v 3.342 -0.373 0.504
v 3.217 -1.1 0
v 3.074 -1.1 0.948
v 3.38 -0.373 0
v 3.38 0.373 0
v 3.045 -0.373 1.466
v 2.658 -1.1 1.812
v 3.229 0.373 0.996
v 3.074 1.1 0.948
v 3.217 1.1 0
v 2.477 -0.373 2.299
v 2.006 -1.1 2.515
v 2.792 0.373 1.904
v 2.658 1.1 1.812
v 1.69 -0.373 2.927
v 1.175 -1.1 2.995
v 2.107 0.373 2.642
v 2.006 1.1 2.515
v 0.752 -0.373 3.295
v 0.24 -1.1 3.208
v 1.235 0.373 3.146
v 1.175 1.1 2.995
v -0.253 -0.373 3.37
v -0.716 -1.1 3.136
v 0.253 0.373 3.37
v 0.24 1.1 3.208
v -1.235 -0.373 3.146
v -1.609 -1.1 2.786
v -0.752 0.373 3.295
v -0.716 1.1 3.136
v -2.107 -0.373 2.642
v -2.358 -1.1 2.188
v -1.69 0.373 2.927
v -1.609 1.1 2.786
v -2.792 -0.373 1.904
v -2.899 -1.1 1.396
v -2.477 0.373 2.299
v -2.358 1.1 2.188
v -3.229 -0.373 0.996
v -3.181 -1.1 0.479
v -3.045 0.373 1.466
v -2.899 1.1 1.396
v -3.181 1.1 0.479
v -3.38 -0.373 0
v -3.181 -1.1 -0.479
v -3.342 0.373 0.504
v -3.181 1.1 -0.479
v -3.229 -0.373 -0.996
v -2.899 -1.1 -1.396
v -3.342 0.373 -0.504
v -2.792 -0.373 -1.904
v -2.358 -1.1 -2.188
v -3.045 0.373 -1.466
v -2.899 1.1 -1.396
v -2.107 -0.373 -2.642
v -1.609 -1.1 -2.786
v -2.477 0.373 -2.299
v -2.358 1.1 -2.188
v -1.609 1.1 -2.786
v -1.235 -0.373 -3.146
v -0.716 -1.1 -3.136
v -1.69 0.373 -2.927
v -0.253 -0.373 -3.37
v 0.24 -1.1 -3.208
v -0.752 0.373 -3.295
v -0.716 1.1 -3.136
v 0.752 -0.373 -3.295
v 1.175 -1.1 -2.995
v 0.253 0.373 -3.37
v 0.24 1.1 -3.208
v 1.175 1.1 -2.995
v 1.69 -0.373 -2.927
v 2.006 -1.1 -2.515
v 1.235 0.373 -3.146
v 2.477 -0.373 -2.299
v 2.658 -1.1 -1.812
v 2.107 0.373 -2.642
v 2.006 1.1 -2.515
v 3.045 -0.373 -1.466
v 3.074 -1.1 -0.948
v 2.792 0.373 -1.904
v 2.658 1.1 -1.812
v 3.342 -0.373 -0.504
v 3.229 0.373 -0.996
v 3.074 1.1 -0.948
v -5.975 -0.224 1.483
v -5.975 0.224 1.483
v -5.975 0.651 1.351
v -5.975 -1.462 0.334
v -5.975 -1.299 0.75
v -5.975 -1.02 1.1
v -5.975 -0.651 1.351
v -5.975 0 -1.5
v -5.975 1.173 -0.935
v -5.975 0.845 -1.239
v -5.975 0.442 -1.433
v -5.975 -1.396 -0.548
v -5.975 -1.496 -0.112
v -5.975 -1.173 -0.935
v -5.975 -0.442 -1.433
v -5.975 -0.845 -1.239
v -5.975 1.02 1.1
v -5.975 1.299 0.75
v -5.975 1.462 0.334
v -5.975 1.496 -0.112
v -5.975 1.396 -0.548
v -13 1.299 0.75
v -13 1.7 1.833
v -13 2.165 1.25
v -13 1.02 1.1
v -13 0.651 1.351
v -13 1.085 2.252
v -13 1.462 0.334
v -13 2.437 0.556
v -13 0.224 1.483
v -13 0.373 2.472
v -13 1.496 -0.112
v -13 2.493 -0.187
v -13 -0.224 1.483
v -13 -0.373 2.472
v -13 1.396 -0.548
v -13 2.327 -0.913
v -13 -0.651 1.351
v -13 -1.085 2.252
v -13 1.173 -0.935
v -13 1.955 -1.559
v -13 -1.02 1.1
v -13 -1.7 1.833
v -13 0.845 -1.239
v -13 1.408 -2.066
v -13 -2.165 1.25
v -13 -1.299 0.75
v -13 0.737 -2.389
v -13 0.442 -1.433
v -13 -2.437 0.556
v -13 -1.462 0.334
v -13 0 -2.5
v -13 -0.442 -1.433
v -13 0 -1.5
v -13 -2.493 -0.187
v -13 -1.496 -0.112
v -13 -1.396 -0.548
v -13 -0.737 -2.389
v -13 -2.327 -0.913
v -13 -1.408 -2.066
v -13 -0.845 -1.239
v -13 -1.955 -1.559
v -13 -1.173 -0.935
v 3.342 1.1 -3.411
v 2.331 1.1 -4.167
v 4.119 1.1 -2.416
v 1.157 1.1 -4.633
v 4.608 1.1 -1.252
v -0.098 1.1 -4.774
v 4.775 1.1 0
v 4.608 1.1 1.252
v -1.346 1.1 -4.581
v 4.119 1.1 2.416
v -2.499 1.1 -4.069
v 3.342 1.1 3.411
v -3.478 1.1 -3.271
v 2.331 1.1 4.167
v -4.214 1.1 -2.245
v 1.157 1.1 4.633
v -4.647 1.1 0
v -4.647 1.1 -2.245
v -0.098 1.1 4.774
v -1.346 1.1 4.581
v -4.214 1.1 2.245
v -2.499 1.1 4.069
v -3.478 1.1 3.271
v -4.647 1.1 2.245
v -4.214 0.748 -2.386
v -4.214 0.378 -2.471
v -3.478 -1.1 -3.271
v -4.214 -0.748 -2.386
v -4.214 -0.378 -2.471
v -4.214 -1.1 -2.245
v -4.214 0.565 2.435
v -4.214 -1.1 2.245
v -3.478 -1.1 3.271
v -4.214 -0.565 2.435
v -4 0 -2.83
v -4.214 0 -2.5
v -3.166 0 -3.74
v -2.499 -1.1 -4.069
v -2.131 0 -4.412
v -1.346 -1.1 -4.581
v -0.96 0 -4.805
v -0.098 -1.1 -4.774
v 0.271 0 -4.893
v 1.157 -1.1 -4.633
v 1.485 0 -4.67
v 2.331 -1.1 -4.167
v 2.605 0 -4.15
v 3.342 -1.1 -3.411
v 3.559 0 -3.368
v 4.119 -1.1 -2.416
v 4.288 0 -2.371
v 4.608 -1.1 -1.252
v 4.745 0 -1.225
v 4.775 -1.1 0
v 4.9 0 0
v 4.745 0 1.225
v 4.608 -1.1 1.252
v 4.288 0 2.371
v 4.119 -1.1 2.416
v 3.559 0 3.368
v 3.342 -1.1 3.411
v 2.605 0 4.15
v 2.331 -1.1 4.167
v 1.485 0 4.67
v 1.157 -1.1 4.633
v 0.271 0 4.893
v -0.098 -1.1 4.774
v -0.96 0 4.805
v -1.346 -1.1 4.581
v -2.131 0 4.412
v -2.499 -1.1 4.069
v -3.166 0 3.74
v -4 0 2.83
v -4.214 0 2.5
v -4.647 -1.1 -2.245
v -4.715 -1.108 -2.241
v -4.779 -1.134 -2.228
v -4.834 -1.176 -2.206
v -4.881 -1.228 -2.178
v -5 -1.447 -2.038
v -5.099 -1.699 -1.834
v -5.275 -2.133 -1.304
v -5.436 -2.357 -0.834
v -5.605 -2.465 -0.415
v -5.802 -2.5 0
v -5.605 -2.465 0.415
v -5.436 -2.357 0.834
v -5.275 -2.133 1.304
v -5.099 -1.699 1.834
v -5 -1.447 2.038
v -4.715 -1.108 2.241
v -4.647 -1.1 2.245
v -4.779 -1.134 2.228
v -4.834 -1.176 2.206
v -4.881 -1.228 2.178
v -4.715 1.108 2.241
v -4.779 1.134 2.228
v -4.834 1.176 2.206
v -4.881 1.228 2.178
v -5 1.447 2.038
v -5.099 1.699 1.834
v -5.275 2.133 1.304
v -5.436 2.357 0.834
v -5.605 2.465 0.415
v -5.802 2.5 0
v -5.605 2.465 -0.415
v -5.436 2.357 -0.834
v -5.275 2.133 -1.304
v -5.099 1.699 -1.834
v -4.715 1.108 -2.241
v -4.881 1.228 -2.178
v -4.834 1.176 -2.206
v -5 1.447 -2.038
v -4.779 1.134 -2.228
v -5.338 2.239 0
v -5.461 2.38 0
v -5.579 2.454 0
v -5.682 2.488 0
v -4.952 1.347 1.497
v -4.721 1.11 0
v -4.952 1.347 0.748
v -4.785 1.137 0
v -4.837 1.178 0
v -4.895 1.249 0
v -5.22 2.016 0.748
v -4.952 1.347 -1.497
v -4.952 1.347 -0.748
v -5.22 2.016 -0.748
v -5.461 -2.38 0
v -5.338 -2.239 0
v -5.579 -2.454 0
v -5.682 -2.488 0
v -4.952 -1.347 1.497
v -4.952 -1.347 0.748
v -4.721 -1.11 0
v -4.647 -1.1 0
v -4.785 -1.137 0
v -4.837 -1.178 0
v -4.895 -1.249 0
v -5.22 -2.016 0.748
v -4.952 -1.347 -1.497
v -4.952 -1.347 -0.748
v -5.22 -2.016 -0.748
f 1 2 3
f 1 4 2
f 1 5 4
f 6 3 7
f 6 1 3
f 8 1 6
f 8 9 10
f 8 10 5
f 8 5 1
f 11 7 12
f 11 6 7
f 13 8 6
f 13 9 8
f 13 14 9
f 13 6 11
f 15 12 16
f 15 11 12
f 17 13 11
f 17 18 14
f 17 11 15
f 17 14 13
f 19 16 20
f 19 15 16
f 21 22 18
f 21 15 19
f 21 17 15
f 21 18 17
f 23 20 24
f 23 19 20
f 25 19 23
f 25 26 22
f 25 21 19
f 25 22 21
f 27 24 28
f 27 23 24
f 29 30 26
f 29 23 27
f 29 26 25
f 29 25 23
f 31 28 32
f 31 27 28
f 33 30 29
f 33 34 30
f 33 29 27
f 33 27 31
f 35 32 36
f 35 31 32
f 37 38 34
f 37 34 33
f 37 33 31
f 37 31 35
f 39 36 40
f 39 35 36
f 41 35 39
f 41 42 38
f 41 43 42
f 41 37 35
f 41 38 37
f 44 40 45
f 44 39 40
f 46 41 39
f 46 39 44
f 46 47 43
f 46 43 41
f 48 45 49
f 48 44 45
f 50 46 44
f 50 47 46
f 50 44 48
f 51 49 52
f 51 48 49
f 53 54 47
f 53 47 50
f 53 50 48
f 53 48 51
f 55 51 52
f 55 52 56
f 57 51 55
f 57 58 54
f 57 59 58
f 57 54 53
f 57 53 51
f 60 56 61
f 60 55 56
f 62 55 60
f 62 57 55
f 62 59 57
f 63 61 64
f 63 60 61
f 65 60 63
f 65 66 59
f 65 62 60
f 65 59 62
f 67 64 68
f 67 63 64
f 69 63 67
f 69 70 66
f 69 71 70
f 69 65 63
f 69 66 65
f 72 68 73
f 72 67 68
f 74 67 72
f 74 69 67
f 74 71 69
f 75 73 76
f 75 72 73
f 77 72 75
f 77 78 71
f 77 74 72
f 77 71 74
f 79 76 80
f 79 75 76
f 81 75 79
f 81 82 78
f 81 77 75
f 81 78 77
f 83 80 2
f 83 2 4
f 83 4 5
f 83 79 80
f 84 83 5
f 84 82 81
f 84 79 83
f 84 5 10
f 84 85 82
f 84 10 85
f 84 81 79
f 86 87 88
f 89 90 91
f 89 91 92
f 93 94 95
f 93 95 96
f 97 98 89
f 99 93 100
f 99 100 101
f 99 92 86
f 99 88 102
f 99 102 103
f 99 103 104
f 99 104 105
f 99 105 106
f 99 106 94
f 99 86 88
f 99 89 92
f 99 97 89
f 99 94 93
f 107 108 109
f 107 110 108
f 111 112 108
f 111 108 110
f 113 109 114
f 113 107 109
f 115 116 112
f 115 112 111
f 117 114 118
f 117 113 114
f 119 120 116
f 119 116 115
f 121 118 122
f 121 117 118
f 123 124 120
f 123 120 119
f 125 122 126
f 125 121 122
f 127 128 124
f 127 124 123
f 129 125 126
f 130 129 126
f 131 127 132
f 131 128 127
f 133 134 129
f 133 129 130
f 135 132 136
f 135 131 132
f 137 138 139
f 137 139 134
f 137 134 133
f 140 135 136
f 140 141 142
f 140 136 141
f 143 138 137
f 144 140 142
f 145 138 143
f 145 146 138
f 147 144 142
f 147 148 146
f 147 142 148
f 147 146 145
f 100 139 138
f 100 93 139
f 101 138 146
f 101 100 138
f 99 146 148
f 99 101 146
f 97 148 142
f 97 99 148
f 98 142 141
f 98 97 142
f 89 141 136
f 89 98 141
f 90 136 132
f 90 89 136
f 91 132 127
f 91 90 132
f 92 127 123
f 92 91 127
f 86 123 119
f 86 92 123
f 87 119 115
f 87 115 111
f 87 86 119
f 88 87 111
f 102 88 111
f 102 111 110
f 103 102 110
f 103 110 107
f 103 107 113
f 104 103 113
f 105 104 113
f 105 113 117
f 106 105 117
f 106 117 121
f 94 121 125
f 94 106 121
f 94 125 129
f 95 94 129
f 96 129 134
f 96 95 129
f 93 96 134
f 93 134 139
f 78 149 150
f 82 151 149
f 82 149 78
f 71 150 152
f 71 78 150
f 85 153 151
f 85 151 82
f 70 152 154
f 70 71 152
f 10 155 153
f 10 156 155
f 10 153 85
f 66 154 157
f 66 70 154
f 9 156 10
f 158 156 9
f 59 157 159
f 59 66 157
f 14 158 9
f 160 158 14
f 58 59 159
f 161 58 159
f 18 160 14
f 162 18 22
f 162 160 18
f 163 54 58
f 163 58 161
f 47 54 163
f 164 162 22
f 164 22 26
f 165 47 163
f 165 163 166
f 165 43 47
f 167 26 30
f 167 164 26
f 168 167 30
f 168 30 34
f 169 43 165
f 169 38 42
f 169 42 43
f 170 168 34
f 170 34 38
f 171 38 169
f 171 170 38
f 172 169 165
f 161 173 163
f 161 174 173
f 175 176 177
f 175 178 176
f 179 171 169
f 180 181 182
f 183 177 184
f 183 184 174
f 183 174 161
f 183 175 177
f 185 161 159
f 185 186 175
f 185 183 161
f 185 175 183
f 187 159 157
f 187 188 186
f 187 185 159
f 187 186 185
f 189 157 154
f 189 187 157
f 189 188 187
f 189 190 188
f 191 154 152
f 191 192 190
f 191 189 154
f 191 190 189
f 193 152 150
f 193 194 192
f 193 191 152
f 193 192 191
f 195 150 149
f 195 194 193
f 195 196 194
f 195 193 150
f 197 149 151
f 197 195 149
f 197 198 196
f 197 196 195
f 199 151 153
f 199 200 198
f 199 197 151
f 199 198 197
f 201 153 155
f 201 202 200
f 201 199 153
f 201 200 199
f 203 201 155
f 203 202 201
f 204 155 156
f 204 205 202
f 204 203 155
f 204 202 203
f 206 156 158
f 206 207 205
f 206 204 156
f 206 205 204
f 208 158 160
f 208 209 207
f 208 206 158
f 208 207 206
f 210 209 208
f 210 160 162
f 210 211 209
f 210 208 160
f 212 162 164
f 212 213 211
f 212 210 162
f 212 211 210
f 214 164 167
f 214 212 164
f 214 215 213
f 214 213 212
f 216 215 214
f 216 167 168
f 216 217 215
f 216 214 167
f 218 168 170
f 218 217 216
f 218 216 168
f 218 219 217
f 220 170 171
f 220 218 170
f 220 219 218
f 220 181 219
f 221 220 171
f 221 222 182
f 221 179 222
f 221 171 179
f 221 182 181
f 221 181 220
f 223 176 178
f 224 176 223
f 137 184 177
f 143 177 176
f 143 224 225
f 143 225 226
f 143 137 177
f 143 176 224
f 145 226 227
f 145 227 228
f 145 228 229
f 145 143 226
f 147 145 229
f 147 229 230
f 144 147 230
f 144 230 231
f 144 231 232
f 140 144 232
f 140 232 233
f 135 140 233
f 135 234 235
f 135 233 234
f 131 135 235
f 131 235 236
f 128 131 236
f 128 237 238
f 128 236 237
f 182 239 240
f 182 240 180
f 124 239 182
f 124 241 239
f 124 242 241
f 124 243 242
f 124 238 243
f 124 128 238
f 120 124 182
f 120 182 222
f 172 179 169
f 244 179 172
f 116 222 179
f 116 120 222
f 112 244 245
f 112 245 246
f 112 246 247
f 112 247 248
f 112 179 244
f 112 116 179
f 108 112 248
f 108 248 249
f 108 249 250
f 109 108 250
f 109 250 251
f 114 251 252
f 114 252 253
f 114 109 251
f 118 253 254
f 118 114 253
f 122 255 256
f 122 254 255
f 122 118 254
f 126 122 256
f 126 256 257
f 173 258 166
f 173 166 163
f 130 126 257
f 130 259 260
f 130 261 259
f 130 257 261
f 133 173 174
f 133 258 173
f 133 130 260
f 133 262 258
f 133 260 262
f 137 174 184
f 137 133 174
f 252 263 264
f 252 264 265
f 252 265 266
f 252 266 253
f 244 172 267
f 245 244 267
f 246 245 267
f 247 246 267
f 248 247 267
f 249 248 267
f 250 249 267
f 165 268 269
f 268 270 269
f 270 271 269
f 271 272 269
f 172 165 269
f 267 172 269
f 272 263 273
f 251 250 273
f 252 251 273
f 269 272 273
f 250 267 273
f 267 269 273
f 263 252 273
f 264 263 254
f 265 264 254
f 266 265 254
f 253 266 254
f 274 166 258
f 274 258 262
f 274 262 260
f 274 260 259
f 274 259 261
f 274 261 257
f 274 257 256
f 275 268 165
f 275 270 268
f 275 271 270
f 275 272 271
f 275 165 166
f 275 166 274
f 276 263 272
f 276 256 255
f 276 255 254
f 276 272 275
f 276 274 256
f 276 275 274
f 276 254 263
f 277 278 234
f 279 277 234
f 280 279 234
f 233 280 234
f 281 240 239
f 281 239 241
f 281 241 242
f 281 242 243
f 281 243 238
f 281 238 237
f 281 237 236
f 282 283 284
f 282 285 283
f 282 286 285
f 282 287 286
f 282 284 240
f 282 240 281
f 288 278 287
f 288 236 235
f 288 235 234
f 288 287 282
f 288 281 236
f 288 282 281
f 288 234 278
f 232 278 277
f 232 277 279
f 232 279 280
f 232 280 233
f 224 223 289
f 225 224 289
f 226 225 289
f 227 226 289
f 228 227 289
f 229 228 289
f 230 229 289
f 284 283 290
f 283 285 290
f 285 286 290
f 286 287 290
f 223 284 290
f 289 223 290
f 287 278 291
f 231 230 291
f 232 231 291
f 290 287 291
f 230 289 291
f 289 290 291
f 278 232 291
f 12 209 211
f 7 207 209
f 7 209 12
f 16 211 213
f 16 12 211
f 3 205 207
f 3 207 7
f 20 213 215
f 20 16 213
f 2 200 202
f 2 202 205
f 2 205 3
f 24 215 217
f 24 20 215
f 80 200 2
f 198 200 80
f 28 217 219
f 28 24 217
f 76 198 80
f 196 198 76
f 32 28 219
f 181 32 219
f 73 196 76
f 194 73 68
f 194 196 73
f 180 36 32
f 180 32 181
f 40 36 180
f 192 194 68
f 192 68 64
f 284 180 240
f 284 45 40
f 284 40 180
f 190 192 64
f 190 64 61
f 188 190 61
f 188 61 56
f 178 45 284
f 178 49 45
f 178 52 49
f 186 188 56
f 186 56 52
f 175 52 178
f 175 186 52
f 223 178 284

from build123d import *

# Parameters (mm, degrees)
CUT_EXTRUDE1_REACH                  = 16.116
CUT_EXTRUDE1_END_RADIUS             = 2.5
CUT_EXTRUDE1_DIRECTION_2_REACH      = 16.116
CUT_EXTRUDE1_DIRECTION_2_END_RADIUS = 2.5


with BuildPart() as part:
    # Sketch2 → Revolve1 (revolve)
    with BuildSketch(Plane.XY):
        with BuildLine():
            Line((3.217141588, 1.1), (4.774934555, 1.1))
            ThreePointArc((4.774934555, 1.1), (4.9, 0), (4.774934555, -1.1))
            Line((4.774934555, -1.1), (3.217141588, -1.1))
            ThreePointArc((3.217141588, -1.1), (3.4, 0), (3.217141588, 1.1))
        make_face()
    revolve(axis=Axis((0, 4.071851736, 0), (0, -1, 0)))

    # Sketch3 → Revolve2 (revolve)
    with BuildSketch(Plane(origin=(0, 0, 0), x_dir=(1, 0, 0), z_dir=(0, 1, 0))):
        with BuildLine():
            Line((-13, 1.5), (-5.974934555, 1.5))
            Line((-5.974934555, 1.5), (-5.974934555, 0))
            Line((-5.974934555, 0), (-4.774934555, 0))
            ThreePointArc((-4.774934555, 0), (-4.594847185, 1.298991664), (-4.068169121, 2.5))
            Line((-4.068169121, 2.5), (-13, 2.5))
            Line((-13, 2.5), (-13, 1.5))
        make_face()
    revolve(axis=Axis((-1.070003769, 0, 0), (-1, 0, 0)))

    # Cut-Extrude1: up to this cylinder (the profile starts inside it)
    cut_extrude1_end = Plane(origin=(-4.461396, 0, 0), z_dir=(1, 0, 0)) * Cylinder(CUT_EXTRUDE1_END_RADIUS, 38.232024, mode=Mode.PRIVATE)
    # Sketch5 → Cut-Extrude1 (cut, up to the surface)
    with BuildSketch(Plane.XY, mode=Mode.PRIVATE) as cut_extrude1_sk1:
        with BuildLine():
            Line((-5.802324208, 2.5), (-3.740894424, 2.5))
            Line((-3.740894424, 2.5), (-3.740894424, 1.1))
            Line((-3.740894424, 1.1), (-4.646504062, 1.1))
            add(Edge.make_bspline(
                [(-4.646504062, 1.1), (-4.808494897, 1.1), (-5.037328654, 1.452538147), (-5.179468889, 2.019128522), (-5.472528246, 2.5), (-5.802324208, 2.5)],
                knots=[0, 0, 0, 0, 0.209972055, 0.594973977, 1, 1, 1, 1], degree=3))
        make_face()
    cut_extrude1_tool1 = extrude(cut_extrude1_sk1.sketch, amount=-CUT_EXTRUDE1_REACH, mode=Mode.PRIVATE) & cut_extrude1_end
    add(cut_extrude1_tool1.solids().sort_by_distance((-4.461384, 1.858771, 0))[0], mode=Mode.SUBTRACT)
    # Sketch5 → Cut-Extrude1 (cut, up to the surface)
    with BuildSketch(Plane.XY, mode=Mode.PRIVATE) as cut_extrude1_sk2:
        with BuildLine():
            Line((-3.740894424, -1.1), (-4.646504062, -1.1))
            add(Edge.make_bspline(
                [(-4.646504062, -1.1), (-4.808494897, -1.1), (-5.037328654, -1.452538147), (-5.179468889, -2.019128522), (-5.472528246, -2.5), (-5.802324208, -2.5)],
                knots=[0, 0, 0, 0, 0.209972055, 0.594973977, 1, 1, 1, 1], degree=3))
            Line((-5.802324208, -2.5), (-3.740894424, -2.5))
            Line((-3.740894424, -2.5), (-3.740894424, -1.1))
        make_face()
    cut_extrude1_tool2 = extrude(cut_extrude1_sk2.sketch, amount=-CUT_EXTRUDE1_REACH, mode=Mode.PRIVATE) & cut_extrude1_end
    add(cut_extrude1_tool2.solids().sort_by_distance((-4.461408, -1.858734, 0))[0], mode=Mode.SUBTRACT)

    # Cut-Extrude1 direction 2: up to this cylinder (the profile starts inside it)
    cut_extrude1_direction_2_end = Plane(origin=(-4.461396, 0, 0), z_dir=(1, 0, 0)) * Cylinder(CUT_EXTRUDE1_DIRECTION_2_END_RADIUS, 38.232024, mode=Mode.PRIVATE)
    # Sketch5 → Cut-Extrude1 direction 2 (cut, up to the surface)
    with BuildSketch(Plane.XY, mode=Mode.PRIVATE) as cut_extrude1_direction_2_sk1:
        with BuildLine():
            Line((-5.802324208, 2.5), (-3.740894424, 2.5))
            Line((-3.740894424, 2.5), (-3.740894424, 1.1))
            Line((-3.740894424, 1.1), (-4.646504062, 1.1))
            add(Edge.make_bspline(
                [(-4.646504062, 1.1), (-4.808494897, 1.1), (-5.037328654, 1.452538147), (-5.179468889, 2.019128522), (-5.472528246, 2.5), (-5.802324208, 2.5)],
                knots=[0, 0, 0, 0, 0.209972055, 0.594973977, 1, 1, 1, 1], degree=3))
        make_face()
    cut_extrude1_direction_2_tool1 = extrude(cut_extrude1_direction_2_sk1.sketch, amount=CUT_EXTRUDE1_DIRECTION_2_REACH, mode=Mode.PRIVATE) & cut_extrude1_direction_2_end
    add(cut_extrude1_direction_2_tool1.solids().sort_by_distance((-4.461384, 1.858771, 0))[0], mode=Mode.SUBTRACT)
    # Sketch5 → Cut-Extrude1 direction 2 (cut, up to the surface)
    with BuildSketch(Plane.XY, mode=Mode.PRIVATE) as cut_extrude1_direction_2_sk2:
        with BuildLine():
            Line((-3.740894424, -1.1), (-4.646504062, -1.1))
            add(Edge.make_bspline(
                [(-4.646504062, -1.1), (-4.808494897, -1.1), (-5.037328654, -1.452538147), (-5.179468889, -2.019128522), (-5.472528246, -2.5), (-5.802324208, -2.5)],
                knots=[0, 0, 0, 0, 0.209972055, 0.594973977, 1, 1, 1, 1], degree=3))
            Line((-5.802324208, -2.5), (-3.740894424, -2.5))
            Line((-3.740894424, -2.5), (-3.740894424, -1.1))
        make_face()
    cut_extrude1_direction_2_tool2 = extrude(cut_extrude1_direction_2_sk2.sketch, amount=CUT_EXTRUDE1_DIRECTION_2_REACH, mode=Mode.PRIVATE) & cut_extrude1_direction_2_end
    add(cut_extrude1_direction_2_tool2.solids().sort_by_distance((-4.461408, -1.858734, 0))[0], mode=Mode.SUBTRACT)


solid = part.part
